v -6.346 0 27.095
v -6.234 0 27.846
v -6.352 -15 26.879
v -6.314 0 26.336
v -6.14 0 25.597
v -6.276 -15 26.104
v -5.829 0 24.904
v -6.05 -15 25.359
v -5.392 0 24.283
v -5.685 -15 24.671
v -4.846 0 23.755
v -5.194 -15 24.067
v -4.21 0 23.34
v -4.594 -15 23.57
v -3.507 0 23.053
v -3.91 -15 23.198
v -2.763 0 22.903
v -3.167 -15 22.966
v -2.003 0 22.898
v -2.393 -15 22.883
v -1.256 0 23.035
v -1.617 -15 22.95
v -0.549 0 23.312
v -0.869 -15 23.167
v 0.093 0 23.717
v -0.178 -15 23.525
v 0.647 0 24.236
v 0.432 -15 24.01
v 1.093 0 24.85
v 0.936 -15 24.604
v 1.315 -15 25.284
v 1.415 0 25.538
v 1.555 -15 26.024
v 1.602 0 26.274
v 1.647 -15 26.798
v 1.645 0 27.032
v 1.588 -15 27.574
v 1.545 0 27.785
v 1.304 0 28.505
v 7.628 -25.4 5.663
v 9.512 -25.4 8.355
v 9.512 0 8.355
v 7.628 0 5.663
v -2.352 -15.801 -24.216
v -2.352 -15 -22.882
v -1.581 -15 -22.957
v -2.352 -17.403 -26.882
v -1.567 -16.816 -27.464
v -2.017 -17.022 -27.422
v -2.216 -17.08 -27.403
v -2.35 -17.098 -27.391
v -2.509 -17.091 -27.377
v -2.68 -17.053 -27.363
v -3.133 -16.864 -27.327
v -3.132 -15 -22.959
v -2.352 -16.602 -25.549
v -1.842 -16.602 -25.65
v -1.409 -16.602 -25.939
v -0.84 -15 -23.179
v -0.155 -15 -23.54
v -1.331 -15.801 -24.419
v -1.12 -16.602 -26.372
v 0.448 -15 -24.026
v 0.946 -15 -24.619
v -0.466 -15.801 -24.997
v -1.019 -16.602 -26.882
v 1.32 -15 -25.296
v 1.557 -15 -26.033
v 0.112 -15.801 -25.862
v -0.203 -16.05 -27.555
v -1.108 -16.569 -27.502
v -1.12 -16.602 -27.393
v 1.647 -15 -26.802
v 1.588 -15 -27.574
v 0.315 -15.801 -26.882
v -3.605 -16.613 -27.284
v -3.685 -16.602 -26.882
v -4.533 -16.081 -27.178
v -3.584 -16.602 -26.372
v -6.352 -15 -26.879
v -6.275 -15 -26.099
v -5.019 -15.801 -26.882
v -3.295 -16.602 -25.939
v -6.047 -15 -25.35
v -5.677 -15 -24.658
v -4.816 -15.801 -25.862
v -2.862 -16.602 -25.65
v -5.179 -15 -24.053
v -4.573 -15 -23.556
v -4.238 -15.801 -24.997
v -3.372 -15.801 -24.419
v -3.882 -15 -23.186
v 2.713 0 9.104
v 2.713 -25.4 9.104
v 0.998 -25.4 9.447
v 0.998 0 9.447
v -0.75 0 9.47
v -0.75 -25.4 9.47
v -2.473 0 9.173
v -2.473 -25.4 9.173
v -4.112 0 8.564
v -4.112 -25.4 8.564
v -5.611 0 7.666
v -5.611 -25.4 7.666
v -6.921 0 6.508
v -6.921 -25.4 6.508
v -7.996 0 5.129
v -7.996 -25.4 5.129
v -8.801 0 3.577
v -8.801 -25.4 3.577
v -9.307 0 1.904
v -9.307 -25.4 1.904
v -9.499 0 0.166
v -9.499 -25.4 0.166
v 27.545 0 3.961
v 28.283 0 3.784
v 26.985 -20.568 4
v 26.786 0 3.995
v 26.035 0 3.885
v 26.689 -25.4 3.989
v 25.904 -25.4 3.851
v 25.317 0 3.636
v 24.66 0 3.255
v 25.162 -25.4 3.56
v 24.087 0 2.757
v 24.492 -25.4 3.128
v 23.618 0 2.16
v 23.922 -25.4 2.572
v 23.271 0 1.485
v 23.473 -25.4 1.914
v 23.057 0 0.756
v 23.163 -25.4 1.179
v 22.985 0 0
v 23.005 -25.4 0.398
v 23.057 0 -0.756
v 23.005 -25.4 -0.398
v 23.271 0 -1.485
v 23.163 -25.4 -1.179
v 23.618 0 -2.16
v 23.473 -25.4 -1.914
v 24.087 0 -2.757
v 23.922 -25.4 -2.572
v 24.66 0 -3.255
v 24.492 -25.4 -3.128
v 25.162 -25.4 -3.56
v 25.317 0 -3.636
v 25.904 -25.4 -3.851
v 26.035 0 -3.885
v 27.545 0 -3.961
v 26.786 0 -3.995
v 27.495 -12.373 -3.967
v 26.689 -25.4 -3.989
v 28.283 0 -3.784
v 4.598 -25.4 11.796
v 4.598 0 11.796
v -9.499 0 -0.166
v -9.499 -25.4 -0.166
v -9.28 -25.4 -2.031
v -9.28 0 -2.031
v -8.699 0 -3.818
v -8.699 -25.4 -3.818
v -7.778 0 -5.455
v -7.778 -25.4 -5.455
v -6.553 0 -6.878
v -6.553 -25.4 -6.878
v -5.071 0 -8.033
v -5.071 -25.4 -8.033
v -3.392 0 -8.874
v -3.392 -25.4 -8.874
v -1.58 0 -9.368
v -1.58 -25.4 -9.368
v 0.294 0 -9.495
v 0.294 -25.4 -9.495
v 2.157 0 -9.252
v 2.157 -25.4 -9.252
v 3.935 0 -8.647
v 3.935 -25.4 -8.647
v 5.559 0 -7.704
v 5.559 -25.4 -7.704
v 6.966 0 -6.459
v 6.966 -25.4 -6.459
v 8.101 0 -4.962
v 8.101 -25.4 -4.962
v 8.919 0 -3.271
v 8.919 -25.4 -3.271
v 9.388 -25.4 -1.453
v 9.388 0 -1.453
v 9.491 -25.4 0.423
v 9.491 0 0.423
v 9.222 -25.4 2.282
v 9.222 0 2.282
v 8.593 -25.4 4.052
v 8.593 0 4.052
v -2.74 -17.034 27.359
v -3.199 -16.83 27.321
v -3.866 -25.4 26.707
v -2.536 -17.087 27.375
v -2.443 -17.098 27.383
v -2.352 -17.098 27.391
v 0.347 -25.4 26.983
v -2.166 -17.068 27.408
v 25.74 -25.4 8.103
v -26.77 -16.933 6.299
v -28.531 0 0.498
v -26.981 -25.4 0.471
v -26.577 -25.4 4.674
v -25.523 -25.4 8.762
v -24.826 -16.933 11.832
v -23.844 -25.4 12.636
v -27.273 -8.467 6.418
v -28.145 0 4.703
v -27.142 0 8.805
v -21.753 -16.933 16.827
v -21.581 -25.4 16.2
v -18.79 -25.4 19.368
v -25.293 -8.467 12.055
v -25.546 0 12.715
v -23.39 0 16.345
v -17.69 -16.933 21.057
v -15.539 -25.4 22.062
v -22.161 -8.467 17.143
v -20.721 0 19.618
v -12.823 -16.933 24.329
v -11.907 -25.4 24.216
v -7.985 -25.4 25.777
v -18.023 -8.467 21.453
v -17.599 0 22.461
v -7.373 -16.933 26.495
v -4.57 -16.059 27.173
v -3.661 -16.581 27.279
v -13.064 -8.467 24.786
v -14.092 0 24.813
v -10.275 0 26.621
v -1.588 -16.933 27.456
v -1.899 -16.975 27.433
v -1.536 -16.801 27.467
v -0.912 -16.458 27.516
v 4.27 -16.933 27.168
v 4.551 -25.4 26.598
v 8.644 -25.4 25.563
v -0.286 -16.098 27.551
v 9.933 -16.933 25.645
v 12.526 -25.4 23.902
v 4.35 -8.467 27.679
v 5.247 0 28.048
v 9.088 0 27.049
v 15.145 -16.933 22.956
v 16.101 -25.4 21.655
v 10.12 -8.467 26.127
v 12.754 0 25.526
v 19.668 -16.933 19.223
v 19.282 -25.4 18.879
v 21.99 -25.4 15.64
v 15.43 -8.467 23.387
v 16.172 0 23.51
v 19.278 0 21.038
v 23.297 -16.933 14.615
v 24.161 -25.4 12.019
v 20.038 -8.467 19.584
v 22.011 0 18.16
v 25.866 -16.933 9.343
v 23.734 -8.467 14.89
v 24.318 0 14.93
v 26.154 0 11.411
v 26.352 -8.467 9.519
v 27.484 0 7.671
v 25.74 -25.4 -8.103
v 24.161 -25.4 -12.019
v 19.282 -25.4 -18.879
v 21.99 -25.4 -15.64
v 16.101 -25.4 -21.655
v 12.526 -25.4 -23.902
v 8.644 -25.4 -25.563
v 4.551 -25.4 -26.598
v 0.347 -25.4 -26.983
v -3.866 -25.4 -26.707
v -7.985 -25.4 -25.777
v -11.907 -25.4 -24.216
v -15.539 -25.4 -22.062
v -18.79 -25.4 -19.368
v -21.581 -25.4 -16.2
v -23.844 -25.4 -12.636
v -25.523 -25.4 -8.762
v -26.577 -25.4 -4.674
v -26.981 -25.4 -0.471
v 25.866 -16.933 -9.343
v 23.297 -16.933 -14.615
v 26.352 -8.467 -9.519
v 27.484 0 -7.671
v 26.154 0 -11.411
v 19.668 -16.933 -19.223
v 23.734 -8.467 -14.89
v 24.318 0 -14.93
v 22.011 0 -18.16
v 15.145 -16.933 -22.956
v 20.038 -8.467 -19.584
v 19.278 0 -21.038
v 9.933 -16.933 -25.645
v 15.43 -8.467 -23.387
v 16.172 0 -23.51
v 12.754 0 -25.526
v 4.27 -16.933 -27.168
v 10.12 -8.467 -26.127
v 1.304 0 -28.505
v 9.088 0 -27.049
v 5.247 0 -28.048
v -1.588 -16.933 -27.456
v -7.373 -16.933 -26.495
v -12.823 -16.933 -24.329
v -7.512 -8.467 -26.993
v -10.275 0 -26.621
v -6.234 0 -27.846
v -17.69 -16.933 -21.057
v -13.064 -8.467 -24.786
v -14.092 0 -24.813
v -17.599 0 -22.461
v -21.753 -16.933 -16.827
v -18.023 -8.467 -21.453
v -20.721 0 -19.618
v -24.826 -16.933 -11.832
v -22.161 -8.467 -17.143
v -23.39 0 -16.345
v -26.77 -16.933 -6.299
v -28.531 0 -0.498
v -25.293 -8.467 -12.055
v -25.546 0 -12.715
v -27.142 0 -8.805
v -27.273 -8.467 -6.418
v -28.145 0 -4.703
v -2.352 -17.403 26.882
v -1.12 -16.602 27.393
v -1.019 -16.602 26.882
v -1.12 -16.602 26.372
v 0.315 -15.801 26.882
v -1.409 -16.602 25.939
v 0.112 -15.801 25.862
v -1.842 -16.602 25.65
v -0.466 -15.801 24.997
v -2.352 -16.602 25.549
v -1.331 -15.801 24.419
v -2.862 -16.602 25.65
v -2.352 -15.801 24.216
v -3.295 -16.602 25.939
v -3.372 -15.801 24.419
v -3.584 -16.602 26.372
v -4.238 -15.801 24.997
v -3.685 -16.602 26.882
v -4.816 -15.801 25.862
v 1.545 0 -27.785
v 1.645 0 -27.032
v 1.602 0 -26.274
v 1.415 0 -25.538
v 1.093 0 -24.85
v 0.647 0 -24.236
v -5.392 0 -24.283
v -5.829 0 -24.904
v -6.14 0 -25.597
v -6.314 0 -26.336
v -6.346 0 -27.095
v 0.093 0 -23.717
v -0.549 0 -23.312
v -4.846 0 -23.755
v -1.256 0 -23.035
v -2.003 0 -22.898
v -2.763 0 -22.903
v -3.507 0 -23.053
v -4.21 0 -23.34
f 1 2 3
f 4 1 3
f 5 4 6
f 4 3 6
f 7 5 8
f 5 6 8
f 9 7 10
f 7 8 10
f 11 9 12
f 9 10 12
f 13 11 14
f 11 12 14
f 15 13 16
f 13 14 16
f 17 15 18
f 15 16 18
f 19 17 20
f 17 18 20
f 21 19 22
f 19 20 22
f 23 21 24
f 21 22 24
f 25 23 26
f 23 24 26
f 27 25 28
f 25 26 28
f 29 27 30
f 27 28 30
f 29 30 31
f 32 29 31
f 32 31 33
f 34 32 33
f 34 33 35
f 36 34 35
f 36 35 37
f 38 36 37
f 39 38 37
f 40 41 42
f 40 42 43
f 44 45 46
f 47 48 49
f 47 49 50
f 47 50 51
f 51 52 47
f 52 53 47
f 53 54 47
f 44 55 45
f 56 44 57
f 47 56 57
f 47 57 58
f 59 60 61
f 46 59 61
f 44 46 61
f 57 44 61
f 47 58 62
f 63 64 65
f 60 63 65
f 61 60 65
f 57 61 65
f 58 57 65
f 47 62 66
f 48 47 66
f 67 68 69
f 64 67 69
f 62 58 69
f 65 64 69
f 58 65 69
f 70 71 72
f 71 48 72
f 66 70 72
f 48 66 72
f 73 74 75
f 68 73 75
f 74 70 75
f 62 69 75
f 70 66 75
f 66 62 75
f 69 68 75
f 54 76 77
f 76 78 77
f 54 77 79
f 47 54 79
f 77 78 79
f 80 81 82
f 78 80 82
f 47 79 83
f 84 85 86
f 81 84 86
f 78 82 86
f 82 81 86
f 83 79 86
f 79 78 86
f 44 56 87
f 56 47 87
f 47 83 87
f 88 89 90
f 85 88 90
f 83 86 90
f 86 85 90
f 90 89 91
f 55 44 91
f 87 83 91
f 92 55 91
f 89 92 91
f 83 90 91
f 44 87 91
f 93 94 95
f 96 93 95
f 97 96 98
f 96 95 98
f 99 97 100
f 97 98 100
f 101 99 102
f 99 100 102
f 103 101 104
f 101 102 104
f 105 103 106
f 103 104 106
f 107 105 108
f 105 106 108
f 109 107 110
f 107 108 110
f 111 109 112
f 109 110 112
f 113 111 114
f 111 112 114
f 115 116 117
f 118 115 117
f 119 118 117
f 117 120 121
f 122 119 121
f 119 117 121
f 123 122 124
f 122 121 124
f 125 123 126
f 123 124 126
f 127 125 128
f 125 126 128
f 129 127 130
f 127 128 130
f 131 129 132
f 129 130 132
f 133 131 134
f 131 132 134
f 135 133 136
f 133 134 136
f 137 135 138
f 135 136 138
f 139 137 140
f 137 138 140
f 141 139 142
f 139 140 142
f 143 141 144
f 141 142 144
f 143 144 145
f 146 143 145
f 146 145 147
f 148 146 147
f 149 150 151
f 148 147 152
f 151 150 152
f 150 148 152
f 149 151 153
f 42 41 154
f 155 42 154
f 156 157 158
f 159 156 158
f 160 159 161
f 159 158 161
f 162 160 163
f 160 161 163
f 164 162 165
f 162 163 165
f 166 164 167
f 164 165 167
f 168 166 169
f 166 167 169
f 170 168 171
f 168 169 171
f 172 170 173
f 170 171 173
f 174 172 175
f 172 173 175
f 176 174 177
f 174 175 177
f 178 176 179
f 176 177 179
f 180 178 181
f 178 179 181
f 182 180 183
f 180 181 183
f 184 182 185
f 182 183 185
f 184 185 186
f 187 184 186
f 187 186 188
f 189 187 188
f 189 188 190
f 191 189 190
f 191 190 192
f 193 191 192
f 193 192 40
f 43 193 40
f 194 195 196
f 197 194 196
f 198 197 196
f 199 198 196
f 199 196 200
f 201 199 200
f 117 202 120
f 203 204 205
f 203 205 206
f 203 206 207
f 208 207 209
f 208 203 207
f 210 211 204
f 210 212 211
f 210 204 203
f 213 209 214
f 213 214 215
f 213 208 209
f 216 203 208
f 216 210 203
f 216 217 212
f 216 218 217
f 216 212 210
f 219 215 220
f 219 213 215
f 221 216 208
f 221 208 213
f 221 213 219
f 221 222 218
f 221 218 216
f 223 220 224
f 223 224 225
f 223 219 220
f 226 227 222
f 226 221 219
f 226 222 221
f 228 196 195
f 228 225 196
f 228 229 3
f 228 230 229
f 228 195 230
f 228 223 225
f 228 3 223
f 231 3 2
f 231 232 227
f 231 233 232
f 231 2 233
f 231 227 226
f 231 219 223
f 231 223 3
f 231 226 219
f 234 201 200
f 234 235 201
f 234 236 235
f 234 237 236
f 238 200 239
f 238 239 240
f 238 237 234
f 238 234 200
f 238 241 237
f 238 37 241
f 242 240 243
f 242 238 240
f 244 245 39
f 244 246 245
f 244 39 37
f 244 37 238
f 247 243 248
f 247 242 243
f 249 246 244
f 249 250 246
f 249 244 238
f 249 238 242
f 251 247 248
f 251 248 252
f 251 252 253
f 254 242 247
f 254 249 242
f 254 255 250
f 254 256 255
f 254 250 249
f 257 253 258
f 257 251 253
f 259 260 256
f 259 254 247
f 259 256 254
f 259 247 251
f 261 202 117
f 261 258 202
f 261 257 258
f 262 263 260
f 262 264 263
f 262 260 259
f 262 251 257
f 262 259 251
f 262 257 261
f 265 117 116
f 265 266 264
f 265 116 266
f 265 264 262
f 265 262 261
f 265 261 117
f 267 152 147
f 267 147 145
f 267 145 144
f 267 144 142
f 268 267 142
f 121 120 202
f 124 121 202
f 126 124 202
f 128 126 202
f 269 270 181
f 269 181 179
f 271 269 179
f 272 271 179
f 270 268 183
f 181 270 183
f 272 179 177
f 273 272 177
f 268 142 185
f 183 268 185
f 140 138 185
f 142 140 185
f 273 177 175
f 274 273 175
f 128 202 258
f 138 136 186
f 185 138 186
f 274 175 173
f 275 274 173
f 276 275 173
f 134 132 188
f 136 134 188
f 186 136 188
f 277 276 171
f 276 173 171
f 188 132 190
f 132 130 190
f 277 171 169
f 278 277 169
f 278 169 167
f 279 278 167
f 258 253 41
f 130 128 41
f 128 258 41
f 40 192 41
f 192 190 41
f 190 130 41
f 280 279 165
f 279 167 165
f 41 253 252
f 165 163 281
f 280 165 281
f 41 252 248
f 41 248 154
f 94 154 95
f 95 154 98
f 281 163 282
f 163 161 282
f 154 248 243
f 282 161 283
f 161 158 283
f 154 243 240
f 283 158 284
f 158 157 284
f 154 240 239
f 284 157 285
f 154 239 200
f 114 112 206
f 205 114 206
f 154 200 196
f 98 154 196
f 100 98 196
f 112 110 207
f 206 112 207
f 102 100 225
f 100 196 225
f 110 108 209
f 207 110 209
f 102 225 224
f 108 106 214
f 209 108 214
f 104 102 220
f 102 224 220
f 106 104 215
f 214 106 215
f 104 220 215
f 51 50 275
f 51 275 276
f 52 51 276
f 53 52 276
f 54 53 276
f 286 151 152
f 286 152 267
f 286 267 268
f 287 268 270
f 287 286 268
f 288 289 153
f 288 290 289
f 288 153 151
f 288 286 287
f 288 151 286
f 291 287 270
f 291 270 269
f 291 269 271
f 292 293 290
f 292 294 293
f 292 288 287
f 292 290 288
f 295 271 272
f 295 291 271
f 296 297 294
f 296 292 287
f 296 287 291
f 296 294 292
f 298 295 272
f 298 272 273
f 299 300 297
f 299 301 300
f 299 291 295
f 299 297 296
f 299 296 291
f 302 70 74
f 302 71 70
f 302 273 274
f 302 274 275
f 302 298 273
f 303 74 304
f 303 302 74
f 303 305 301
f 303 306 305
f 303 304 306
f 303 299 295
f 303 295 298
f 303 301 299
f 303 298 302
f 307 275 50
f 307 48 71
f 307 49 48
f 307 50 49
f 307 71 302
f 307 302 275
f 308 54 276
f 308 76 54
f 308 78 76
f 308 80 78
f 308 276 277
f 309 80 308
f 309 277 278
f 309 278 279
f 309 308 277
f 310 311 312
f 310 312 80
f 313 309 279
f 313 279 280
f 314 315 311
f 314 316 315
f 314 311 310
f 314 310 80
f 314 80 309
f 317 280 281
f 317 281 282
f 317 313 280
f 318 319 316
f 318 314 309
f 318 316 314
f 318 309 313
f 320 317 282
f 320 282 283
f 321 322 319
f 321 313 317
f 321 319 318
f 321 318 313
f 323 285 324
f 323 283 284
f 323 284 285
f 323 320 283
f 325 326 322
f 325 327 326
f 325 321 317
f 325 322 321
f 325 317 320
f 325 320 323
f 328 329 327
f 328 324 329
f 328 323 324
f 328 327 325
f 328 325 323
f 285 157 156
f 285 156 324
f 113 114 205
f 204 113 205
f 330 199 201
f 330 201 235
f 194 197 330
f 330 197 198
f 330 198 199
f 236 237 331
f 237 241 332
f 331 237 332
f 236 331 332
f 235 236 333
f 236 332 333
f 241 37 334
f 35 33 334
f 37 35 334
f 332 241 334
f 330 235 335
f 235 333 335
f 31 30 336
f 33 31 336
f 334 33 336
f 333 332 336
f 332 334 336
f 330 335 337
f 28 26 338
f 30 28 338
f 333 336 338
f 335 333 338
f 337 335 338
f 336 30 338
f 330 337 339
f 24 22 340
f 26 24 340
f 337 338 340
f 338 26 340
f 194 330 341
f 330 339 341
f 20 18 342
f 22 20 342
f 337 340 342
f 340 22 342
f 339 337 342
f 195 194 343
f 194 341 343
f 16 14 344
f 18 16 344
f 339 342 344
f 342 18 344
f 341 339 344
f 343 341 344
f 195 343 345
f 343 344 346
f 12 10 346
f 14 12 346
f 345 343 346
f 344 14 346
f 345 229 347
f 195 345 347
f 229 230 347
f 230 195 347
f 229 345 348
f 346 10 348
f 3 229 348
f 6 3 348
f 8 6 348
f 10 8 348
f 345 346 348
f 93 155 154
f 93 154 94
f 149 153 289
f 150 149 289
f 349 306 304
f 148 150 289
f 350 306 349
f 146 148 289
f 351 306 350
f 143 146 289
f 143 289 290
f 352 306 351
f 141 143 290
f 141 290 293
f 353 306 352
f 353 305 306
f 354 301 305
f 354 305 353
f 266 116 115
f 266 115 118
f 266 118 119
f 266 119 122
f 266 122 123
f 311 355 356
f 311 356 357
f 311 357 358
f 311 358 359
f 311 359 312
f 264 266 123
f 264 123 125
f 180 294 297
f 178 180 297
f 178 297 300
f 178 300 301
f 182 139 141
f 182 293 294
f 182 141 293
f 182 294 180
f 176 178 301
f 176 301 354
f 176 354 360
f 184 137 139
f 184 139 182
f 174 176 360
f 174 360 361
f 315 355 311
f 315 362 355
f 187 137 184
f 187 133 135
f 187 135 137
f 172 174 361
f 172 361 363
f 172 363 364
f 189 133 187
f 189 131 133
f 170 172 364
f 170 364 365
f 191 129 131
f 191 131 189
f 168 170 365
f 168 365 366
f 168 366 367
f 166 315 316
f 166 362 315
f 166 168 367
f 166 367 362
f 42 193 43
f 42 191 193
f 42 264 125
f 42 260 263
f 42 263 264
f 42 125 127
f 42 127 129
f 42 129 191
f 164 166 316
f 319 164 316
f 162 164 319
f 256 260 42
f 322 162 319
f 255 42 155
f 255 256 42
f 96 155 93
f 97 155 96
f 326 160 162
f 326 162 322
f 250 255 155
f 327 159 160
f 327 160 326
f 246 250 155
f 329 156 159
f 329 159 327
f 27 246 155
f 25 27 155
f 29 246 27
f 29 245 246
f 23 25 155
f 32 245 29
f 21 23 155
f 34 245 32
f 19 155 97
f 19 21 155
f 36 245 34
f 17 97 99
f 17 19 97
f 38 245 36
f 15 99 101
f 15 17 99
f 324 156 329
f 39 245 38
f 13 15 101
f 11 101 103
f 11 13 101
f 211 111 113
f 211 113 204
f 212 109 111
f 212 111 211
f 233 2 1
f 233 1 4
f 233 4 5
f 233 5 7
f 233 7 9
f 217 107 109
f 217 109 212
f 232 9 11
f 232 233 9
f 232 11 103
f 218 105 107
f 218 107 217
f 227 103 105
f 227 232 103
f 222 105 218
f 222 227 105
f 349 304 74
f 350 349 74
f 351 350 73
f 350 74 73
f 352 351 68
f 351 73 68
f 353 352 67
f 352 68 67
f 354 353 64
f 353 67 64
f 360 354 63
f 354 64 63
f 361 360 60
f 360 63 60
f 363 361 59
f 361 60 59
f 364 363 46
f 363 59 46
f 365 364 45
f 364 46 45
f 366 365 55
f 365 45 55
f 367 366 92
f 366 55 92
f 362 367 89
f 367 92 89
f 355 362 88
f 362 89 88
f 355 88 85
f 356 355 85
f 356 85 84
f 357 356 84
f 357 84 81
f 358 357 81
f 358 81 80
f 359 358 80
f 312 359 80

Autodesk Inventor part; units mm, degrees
ref_plane "YZ Plane" through (0, 0, 0) normal (1, 0, 0) x (0, 1, 0)
ref_plane "XZ Plane" through (0, 0, 0) normal (0, 1, 0) x (-1, 0, 0)
ref_plane "XY Plane" through (0, 0, 0) normal (0, 0, 1) x (1, 0, 0)
sketch "Sketch2" plane through (0, 0, 0) normal (0, 0, 1) x (1, 0, 0)
  line L0 (9.5, 0) -> (9.5, -25.4)
  line L1 (9.5, 0) -> (28.535, 0)
  line L2 (9.5, -25.4) -> (26.985, -25.4)
  line L3 (28.535, 0) -> (26.985, -25.4)
  line L4 (0, -30.48) -> (0, 5.08) projected
  point P0 (0, 0)
  dimension "d5" = 9.5
  dimension "d6" = 25.4
  dimension "d7" = 19.035
  dimension "d8" = 17.485
revolve "Revolution1" add sketch "Sketch2" angle 358 mid plane about axis through (0, -10, 0) along (0, 1, 0)
sketch "Sketch3" plane through (0, 0, 0) normal (0, 1, 0) x (-1, 0, 0)
  line L0 (0, 0) -> (-7.055, 10.0756) construction
  line L1 (0, 0) -> (-9.5, 0) construction
  arc A0 (9.4986, 0.1658) -> (9.4986, -0.1658) centre (0, 0) ccw projected
  line L2 (-9.5124, 8.3548) -> (-4.5975, 11.7963)
  line L3 (-9.5124, 8.3548) -> (-7.6276, 5.663)
  line L4 (-4.5975, 11.7963) -> (-2.7127, 9.1045)
  dimension "d10" = 55
  dimension "d11" = 12.3
  dimension "d12" = 6
extrude "Extrusion2" cut sketch "Sketch3" against normal through all
sketch "Sketch4" plane through (0, 0, 0) normal (0, 1, 0) x (-1, 0, 0)
  arc A0 (26.9809, 0.471) -> (26.9809, -0.471) centre (0, 0) ccw projected
  point P0 (0, 0)
  point P1 (-26.985, 0)
sketch "Sketch5" plane through (0, 0, 0) normal (0, 1, 0) x (-1, 0, 0)
  arc A0 (26.9809, 0.471) -> (26.9809, -0.471) centre (0, 0) ccw projected
  arc A1 (26.9809, 0.471) -> (26.9809, -0.471) centre (0, 0) ccw projected
  line L0 (0, 0) -> (26.985, 0) construction
  line L1 (0, 0) -> (3.6164, 41.3358) construction
  line L2 (0, 0) -> (3.8154, -43.6107) construction
  point P0 (0, 0)
  point P1 (-26.6885, 3.989)
  point P2 (-26.6885, -3.989)
  point P3 (2.3519, -26.8823)
  point P4 (2.3519, 26.8823)
  dimension "d18" = 85
  dimension "d21" = 85
hole "Hole1" at (26.985, 0, 0) direction (0, -1, 0) diameter 8 end through all
hole "Hole2" at (-2.3519, 0, -26.8823) at (-2.3519, 0, 26.8823) direction (0, -1, 0) diameter 8 depth 15 tip angle 118
equation "\"d21\" = d18"
properties part number "Втулка для шкива"
